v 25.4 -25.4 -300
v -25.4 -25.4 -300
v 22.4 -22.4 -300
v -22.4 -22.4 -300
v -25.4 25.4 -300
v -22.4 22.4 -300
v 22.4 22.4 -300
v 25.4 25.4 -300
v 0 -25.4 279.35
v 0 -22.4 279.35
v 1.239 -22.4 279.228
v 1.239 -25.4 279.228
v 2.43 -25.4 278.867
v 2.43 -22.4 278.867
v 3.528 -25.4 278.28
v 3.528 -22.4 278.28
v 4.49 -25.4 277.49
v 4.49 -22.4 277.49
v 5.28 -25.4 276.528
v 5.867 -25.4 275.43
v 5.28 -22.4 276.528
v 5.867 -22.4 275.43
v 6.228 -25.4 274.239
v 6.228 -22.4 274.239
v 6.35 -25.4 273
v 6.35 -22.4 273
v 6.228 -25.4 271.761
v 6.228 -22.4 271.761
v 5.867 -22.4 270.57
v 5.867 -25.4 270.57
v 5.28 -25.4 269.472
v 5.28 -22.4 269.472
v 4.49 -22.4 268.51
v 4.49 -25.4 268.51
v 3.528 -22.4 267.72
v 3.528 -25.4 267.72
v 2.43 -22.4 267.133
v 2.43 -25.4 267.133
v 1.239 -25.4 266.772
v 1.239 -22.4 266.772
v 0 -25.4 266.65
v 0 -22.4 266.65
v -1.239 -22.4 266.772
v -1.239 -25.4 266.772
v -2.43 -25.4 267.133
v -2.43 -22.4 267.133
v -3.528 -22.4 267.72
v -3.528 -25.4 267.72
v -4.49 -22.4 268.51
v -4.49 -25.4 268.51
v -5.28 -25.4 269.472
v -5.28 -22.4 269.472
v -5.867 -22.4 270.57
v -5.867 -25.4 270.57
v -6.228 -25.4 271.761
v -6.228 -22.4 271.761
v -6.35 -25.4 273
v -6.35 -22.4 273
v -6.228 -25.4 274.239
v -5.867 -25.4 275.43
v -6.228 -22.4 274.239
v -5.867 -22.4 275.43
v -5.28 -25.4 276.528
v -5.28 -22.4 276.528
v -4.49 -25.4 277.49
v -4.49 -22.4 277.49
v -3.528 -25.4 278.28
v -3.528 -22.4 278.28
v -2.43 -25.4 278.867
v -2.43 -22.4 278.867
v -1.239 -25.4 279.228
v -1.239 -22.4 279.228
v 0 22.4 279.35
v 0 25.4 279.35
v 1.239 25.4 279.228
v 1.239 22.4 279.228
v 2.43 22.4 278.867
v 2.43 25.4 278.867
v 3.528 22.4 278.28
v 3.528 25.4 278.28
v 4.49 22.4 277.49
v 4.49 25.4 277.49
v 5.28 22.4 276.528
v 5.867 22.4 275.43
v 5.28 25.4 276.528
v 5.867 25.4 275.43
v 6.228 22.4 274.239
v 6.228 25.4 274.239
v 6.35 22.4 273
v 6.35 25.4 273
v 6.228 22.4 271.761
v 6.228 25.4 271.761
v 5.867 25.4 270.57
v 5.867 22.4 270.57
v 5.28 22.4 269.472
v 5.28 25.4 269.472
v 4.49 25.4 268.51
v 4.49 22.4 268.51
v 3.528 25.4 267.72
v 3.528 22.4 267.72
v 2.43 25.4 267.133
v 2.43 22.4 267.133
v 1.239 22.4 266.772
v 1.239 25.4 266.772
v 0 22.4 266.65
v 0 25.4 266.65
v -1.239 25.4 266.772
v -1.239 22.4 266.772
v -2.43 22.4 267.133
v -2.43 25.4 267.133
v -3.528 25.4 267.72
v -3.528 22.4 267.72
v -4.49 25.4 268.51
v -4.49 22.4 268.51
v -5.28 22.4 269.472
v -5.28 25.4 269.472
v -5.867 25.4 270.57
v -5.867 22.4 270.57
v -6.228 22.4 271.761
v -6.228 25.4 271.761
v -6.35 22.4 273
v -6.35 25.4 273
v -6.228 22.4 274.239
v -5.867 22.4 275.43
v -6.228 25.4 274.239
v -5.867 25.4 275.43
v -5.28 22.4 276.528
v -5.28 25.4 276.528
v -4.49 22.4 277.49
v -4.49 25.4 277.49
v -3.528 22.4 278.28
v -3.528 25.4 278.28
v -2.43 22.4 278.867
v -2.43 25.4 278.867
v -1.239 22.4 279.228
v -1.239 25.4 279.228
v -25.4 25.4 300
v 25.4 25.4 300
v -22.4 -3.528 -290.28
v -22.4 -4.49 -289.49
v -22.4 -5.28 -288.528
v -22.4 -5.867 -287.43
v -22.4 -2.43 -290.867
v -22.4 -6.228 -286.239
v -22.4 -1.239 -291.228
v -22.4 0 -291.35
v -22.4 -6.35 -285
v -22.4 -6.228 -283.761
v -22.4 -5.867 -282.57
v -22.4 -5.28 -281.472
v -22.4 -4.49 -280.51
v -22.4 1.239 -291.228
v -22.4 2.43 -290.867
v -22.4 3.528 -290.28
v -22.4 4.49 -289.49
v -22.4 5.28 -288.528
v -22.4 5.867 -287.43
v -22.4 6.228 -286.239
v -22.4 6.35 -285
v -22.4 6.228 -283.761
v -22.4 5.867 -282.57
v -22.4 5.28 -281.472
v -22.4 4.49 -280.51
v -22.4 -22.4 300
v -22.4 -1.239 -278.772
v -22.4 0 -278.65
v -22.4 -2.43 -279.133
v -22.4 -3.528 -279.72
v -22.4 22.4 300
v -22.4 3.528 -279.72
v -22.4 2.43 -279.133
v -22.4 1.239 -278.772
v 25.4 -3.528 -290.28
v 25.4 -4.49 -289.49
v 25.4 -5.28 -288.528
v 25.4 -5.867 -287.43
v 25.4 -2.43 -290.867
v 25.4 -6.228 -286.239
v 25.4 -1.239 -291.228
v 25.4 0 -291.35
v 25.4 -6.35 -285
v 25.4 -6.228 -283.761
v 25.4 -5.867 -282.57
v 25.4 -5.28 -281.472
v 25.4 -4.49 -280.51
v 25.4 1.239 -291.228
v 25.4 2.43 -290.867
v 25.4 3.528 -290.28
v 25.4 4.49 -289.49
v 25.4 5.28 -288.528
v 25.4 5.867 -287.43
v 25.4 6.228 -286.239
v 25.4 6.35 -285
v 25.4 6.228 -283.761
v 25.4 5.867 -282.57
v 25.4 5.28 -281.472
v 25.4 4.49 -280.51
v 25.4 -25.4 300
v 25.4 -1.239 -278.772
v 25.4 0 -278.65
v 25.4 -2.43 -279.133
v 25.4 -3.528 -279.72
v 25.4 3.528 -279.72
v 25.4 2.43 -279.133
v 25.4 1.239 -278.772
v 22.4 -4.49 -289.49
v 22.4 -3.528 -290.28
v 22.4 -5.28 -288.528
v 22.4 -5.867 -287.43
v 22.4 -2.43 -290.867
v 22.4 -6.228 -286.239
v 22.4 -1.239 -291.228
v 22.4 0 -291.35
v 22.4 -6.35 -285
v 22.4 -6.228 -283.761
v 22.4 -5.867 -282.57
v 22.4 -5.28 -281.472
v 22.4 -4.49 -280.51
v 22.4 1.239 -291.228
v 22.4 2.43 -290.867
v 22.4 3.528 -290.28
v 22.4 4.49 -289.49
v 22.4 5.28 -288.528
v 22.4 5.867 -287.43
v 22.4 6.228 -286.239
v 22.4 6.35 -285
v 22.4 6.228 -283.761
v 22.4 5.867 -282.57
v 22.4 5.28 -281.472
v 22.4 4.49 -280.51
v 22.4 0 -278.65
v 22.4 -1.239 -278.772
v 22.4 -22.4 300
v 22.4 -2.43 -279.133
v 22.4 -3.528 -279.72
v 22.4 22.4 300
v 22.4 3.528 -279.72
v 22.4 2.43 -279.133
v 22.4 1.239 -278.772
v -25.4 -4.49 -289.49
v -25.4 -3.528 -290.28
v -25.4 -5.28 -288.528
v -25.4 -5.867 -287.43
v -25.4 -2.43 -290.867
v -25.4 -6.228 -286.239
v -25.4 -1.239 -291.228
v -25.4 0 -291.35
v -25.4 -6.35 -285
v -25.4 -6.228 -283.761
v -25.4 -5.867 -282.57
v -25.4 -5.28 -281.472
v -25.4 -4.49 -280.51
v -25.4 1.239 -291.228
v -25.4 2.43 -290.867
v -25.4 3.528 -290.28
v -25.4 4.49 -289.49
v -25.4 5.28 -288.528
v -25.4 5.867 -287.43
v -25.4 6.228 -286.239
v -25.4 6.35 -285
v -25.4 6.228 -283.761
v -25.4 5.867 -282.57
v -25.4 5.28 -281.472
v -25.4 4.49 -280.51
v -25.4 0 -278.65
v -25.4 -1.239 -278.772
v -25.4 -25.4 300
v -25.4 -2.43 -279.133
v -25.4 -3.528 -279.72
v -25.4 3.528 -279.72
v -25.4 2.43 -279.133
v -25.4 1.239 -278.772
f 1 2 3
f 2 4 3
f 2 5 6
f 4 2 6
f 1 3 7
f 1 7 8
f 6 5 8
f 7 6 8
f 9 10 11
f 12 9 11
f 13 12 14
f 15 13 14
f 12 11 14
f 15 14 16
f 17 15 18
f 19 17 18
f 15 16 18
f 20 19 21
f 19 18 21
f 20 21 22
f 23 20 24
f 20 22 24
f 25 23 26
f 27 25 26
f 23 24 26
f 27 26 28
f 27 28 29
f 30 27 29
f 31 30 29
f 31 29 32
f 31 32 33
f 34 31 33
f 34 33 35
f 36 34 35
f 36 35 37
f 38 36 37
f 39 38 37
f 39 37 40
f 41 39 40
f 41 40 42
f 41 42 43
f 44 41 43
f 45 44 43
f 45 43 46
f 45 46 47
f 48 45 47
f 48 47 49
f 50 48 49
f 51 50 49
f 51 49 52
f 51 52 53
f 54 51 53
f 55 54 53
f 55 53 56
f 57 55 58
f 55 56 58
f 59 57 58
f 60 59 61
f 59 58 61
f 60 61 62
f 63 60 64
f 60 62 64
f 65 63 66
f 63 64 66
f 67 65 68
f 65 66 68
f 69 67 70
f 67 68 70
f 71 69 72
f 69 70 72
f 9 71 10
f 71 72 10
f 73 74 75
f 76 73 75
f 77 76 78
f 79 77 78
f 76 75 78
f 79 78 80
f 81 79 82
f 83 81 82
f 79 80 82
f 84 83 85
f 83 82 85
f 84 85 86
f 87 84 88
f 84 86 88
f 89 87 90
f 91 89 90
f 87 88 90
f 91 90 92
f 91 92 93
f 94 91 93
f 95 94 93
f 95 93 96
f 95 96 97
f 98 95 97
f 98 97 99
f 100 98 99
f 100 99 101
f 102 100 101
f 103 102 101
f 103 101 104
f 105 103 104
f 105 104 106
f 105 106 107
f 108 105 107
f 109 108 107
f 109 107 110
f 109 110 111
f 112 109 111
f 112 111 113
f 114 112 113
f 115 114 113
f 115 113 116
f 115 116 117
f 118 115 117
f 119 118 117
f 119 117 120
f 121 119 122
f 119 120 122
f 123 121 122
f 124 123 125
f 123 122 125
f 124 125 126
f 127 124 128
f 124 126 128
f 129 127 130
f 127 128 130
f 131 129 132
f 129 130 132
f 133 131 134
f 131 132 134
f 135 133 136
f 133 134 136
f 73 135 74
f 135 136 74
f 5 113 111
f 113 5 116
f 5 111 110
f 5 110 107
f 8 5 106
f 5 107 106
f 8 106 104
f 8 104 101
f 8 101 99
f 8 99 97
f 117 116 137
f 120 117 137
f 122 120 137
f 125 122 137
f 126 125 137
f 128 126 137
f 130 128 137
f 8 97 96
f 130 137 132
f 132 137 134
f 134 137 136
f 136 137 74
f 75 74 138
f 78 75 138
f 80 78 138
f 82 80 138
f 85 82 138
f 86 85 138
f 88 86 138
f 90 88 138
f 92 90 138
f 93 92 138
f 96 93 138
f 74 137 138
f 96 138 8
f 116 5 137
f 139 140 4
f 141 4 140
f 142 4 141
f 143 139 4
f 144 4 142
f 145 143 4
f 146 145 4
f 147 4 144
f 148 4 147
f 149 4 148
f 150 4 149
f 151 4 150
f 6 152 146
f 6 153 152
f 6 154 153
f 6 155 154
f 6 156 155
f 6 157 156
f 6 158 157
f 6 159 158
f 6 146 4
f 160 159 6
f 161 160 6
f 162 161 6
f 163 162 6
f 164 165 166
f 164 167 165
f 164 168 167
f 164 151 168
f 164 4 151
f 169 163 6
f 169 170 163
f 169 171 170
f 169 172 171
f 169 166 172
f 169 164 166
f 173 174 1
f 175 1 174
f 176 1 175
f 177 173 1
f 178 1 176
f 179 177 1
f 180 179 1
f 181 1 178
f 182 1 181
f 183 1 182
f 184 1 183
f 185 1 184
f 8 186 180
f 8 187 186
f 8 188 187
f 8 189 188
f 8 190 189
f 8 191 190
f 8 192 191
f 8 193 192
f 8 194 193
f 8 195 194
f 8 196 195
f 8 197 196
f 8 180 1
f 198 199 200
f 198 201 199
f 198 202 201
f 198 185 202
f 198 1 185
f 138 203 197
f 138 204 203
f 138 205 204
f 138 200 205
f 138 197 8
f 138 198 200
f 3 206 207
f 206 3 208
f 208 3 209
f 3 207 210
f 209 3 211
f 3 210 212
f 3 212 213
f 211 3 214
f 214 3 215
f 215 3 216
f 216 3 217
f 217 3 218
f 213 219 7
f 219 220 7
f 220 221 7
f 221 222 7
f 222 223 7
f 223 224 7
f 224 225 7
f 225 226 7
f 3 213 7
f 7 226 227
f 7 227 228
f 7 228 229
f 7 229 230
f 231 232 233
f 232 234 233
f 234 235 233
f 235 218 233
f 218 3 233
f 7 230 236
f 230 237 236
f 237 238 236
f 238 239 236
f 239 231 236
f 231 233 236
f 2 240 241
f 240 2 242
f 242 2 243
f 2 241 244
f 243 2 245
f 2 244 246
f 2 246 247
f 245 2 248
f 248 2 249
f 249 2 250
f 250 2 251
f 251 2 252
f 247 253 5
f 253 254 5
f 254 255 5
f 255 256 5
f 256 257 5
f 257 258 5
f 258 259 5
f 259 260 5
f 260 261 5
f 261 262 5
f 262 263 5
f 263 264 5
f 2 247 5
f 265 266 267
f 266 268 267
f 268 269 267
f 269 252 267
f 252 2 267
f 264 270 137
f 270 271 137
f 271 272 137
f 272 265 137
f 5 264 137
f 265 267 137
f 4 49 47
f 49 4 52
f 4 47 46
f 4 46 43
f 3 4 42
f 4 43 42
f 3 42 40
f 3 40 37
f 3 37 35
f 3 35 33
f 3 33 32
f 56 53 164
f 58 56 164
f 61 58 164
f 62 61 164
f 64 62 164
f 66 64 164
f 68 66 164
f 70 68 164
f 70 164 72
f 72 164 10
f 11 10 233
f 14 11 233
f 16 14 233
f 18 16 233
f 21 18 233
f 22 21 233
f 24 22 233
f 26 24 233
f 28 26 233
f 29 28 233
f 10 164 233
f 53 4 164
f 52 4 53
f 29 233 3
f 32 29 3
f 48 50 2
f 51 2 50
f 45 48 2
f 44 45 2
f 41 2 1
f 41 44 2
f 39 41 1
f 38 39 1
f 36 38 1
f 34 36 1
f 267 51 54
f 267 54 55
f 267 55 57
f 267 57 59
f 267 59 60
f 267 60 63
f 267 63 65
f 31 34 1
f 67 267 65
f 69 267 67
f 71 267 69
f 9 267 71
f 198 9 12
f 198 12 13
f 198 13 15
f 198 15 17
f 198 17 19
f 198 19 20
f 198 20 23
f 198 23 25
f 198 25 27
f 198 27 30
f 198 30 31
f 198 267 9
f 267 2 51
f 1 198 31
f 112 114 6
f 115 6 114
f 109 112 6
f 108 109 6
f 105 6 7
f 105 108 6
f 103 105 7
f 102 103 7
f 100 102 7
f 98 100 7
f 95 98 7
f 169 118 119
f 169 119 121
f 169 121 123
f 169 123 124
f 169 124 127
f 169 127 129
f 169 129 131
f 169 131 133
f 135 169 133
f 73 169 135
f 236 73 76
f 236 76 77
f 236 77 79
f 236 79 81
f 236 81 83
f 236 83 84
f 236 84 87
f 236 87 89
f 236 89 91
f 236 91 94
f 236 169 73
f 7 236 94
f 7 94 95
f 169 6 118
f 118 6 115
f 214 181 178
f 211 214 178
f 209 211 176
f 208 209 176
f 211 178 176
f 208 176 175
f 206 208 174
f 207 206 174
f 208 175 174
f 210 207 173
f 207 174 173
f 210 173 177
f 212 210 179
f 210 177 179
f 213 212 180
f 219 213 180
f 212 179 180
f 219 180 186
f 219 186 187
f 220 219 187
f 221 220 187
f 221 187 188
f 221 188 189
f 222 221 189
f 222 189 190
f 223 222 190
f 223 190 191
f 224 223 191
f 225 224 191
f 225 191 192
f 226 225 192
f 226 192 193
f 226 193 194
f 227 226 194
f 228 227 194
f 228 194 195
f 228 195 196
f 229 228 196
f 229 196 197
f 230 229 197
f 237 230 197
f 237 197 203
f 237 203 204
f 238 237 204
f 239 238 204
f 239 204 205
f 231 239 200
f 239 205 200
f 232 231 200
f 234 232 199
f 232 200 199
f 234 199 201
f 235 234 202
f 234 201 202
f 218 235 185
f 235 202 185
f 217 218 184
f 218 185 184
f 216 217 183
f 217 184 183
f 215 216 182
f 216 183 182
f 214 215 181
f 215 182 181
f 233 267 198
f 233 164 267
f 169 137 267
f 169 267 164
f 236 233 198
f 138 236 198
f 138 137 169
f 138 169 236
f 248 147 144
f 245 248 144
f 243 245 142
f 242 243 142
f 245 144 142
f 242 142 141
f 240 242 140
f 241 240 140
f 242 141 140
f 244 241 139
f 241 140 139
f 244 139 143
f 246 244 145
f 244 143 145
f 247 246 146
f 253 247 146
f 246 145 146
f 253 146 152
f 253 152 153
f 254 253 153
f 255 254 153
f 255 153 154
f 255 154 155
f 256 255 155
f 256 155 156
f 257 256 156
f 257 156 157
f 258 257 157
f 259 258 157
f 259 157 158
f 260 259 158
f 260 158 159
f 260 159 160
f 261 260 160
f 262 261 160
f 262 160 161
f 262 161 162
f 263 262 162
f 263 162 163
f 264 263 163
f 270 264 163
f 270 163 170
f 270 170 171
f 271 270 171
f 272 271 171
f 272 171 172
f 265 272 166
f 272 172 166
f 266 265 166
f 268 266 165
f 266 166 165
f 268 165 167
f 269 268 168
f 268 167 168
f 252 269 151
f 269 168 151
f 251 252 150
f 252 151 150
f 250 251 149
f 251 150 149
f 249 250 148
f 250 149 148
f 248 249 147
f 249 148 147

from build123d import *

# Parameters (mm, degrees)
CROQUIS1_W              = 50.8
CROQUIS1_H              = 50.8
CROQUIS1_W_2            = 44.8
CROQUIS1_H_2            = 44.8
SALIENTE_EXTRUIR1_DEPTH = 300
CROQUIS2_R              = 6.35
CORTAR_EXTRUIR1_DEPTH   = 306.32900288
CROQUIS3_R              = 6.35
CORTAR_EXTRUIR2_DEPTH   = 70


with BuildPart() as part:
    # Croquis1 → Saliente-Extruir1 (new, symmetric)
    with BuildSketch(Plane.XY):
        Rectangle(CROQUIS1_W, CROQUIS1_H)
        Rectangle(CROQUIS1_W_2, CROQUIS1_H_2, mode=Mode.SUBTRACT)
    extrude(amount=SALIENTE_EXTRUIR1_DEPTH, both=True)

    # Croquis2 → Cortar-Extruir1 (cut, through all)
    with BuildSketch(Plane(origin=(25.4, 0, 0), x_dir=(0, 0, -1), z_dir=(1, 0, 0))):
        with Locations(Location((285, 0, 0), (0, 0, 270))):
            Circle(CROQUIS2_R)
    extrude(amount=-CORTAR_EXTRUIR1_DEPTH, mode=Mode.SUBTRACT)

    # Croquis3 → Cortar-Extruir2 (cut)
    with BuildSketch(Plane(origin=(0, 25.4, 0), x_dir=(1, 0, 0), z_dir=(0, 1, 0))):
        with Locations(Location((0, -273, 0), (0, 0, 270))):
            Circle(CROQUIS3_R)
    extrude(amount=-CORTAR_EXTRUIR2_DEPTH, mode=Mode.SUBTRACT)


solid = part.part
